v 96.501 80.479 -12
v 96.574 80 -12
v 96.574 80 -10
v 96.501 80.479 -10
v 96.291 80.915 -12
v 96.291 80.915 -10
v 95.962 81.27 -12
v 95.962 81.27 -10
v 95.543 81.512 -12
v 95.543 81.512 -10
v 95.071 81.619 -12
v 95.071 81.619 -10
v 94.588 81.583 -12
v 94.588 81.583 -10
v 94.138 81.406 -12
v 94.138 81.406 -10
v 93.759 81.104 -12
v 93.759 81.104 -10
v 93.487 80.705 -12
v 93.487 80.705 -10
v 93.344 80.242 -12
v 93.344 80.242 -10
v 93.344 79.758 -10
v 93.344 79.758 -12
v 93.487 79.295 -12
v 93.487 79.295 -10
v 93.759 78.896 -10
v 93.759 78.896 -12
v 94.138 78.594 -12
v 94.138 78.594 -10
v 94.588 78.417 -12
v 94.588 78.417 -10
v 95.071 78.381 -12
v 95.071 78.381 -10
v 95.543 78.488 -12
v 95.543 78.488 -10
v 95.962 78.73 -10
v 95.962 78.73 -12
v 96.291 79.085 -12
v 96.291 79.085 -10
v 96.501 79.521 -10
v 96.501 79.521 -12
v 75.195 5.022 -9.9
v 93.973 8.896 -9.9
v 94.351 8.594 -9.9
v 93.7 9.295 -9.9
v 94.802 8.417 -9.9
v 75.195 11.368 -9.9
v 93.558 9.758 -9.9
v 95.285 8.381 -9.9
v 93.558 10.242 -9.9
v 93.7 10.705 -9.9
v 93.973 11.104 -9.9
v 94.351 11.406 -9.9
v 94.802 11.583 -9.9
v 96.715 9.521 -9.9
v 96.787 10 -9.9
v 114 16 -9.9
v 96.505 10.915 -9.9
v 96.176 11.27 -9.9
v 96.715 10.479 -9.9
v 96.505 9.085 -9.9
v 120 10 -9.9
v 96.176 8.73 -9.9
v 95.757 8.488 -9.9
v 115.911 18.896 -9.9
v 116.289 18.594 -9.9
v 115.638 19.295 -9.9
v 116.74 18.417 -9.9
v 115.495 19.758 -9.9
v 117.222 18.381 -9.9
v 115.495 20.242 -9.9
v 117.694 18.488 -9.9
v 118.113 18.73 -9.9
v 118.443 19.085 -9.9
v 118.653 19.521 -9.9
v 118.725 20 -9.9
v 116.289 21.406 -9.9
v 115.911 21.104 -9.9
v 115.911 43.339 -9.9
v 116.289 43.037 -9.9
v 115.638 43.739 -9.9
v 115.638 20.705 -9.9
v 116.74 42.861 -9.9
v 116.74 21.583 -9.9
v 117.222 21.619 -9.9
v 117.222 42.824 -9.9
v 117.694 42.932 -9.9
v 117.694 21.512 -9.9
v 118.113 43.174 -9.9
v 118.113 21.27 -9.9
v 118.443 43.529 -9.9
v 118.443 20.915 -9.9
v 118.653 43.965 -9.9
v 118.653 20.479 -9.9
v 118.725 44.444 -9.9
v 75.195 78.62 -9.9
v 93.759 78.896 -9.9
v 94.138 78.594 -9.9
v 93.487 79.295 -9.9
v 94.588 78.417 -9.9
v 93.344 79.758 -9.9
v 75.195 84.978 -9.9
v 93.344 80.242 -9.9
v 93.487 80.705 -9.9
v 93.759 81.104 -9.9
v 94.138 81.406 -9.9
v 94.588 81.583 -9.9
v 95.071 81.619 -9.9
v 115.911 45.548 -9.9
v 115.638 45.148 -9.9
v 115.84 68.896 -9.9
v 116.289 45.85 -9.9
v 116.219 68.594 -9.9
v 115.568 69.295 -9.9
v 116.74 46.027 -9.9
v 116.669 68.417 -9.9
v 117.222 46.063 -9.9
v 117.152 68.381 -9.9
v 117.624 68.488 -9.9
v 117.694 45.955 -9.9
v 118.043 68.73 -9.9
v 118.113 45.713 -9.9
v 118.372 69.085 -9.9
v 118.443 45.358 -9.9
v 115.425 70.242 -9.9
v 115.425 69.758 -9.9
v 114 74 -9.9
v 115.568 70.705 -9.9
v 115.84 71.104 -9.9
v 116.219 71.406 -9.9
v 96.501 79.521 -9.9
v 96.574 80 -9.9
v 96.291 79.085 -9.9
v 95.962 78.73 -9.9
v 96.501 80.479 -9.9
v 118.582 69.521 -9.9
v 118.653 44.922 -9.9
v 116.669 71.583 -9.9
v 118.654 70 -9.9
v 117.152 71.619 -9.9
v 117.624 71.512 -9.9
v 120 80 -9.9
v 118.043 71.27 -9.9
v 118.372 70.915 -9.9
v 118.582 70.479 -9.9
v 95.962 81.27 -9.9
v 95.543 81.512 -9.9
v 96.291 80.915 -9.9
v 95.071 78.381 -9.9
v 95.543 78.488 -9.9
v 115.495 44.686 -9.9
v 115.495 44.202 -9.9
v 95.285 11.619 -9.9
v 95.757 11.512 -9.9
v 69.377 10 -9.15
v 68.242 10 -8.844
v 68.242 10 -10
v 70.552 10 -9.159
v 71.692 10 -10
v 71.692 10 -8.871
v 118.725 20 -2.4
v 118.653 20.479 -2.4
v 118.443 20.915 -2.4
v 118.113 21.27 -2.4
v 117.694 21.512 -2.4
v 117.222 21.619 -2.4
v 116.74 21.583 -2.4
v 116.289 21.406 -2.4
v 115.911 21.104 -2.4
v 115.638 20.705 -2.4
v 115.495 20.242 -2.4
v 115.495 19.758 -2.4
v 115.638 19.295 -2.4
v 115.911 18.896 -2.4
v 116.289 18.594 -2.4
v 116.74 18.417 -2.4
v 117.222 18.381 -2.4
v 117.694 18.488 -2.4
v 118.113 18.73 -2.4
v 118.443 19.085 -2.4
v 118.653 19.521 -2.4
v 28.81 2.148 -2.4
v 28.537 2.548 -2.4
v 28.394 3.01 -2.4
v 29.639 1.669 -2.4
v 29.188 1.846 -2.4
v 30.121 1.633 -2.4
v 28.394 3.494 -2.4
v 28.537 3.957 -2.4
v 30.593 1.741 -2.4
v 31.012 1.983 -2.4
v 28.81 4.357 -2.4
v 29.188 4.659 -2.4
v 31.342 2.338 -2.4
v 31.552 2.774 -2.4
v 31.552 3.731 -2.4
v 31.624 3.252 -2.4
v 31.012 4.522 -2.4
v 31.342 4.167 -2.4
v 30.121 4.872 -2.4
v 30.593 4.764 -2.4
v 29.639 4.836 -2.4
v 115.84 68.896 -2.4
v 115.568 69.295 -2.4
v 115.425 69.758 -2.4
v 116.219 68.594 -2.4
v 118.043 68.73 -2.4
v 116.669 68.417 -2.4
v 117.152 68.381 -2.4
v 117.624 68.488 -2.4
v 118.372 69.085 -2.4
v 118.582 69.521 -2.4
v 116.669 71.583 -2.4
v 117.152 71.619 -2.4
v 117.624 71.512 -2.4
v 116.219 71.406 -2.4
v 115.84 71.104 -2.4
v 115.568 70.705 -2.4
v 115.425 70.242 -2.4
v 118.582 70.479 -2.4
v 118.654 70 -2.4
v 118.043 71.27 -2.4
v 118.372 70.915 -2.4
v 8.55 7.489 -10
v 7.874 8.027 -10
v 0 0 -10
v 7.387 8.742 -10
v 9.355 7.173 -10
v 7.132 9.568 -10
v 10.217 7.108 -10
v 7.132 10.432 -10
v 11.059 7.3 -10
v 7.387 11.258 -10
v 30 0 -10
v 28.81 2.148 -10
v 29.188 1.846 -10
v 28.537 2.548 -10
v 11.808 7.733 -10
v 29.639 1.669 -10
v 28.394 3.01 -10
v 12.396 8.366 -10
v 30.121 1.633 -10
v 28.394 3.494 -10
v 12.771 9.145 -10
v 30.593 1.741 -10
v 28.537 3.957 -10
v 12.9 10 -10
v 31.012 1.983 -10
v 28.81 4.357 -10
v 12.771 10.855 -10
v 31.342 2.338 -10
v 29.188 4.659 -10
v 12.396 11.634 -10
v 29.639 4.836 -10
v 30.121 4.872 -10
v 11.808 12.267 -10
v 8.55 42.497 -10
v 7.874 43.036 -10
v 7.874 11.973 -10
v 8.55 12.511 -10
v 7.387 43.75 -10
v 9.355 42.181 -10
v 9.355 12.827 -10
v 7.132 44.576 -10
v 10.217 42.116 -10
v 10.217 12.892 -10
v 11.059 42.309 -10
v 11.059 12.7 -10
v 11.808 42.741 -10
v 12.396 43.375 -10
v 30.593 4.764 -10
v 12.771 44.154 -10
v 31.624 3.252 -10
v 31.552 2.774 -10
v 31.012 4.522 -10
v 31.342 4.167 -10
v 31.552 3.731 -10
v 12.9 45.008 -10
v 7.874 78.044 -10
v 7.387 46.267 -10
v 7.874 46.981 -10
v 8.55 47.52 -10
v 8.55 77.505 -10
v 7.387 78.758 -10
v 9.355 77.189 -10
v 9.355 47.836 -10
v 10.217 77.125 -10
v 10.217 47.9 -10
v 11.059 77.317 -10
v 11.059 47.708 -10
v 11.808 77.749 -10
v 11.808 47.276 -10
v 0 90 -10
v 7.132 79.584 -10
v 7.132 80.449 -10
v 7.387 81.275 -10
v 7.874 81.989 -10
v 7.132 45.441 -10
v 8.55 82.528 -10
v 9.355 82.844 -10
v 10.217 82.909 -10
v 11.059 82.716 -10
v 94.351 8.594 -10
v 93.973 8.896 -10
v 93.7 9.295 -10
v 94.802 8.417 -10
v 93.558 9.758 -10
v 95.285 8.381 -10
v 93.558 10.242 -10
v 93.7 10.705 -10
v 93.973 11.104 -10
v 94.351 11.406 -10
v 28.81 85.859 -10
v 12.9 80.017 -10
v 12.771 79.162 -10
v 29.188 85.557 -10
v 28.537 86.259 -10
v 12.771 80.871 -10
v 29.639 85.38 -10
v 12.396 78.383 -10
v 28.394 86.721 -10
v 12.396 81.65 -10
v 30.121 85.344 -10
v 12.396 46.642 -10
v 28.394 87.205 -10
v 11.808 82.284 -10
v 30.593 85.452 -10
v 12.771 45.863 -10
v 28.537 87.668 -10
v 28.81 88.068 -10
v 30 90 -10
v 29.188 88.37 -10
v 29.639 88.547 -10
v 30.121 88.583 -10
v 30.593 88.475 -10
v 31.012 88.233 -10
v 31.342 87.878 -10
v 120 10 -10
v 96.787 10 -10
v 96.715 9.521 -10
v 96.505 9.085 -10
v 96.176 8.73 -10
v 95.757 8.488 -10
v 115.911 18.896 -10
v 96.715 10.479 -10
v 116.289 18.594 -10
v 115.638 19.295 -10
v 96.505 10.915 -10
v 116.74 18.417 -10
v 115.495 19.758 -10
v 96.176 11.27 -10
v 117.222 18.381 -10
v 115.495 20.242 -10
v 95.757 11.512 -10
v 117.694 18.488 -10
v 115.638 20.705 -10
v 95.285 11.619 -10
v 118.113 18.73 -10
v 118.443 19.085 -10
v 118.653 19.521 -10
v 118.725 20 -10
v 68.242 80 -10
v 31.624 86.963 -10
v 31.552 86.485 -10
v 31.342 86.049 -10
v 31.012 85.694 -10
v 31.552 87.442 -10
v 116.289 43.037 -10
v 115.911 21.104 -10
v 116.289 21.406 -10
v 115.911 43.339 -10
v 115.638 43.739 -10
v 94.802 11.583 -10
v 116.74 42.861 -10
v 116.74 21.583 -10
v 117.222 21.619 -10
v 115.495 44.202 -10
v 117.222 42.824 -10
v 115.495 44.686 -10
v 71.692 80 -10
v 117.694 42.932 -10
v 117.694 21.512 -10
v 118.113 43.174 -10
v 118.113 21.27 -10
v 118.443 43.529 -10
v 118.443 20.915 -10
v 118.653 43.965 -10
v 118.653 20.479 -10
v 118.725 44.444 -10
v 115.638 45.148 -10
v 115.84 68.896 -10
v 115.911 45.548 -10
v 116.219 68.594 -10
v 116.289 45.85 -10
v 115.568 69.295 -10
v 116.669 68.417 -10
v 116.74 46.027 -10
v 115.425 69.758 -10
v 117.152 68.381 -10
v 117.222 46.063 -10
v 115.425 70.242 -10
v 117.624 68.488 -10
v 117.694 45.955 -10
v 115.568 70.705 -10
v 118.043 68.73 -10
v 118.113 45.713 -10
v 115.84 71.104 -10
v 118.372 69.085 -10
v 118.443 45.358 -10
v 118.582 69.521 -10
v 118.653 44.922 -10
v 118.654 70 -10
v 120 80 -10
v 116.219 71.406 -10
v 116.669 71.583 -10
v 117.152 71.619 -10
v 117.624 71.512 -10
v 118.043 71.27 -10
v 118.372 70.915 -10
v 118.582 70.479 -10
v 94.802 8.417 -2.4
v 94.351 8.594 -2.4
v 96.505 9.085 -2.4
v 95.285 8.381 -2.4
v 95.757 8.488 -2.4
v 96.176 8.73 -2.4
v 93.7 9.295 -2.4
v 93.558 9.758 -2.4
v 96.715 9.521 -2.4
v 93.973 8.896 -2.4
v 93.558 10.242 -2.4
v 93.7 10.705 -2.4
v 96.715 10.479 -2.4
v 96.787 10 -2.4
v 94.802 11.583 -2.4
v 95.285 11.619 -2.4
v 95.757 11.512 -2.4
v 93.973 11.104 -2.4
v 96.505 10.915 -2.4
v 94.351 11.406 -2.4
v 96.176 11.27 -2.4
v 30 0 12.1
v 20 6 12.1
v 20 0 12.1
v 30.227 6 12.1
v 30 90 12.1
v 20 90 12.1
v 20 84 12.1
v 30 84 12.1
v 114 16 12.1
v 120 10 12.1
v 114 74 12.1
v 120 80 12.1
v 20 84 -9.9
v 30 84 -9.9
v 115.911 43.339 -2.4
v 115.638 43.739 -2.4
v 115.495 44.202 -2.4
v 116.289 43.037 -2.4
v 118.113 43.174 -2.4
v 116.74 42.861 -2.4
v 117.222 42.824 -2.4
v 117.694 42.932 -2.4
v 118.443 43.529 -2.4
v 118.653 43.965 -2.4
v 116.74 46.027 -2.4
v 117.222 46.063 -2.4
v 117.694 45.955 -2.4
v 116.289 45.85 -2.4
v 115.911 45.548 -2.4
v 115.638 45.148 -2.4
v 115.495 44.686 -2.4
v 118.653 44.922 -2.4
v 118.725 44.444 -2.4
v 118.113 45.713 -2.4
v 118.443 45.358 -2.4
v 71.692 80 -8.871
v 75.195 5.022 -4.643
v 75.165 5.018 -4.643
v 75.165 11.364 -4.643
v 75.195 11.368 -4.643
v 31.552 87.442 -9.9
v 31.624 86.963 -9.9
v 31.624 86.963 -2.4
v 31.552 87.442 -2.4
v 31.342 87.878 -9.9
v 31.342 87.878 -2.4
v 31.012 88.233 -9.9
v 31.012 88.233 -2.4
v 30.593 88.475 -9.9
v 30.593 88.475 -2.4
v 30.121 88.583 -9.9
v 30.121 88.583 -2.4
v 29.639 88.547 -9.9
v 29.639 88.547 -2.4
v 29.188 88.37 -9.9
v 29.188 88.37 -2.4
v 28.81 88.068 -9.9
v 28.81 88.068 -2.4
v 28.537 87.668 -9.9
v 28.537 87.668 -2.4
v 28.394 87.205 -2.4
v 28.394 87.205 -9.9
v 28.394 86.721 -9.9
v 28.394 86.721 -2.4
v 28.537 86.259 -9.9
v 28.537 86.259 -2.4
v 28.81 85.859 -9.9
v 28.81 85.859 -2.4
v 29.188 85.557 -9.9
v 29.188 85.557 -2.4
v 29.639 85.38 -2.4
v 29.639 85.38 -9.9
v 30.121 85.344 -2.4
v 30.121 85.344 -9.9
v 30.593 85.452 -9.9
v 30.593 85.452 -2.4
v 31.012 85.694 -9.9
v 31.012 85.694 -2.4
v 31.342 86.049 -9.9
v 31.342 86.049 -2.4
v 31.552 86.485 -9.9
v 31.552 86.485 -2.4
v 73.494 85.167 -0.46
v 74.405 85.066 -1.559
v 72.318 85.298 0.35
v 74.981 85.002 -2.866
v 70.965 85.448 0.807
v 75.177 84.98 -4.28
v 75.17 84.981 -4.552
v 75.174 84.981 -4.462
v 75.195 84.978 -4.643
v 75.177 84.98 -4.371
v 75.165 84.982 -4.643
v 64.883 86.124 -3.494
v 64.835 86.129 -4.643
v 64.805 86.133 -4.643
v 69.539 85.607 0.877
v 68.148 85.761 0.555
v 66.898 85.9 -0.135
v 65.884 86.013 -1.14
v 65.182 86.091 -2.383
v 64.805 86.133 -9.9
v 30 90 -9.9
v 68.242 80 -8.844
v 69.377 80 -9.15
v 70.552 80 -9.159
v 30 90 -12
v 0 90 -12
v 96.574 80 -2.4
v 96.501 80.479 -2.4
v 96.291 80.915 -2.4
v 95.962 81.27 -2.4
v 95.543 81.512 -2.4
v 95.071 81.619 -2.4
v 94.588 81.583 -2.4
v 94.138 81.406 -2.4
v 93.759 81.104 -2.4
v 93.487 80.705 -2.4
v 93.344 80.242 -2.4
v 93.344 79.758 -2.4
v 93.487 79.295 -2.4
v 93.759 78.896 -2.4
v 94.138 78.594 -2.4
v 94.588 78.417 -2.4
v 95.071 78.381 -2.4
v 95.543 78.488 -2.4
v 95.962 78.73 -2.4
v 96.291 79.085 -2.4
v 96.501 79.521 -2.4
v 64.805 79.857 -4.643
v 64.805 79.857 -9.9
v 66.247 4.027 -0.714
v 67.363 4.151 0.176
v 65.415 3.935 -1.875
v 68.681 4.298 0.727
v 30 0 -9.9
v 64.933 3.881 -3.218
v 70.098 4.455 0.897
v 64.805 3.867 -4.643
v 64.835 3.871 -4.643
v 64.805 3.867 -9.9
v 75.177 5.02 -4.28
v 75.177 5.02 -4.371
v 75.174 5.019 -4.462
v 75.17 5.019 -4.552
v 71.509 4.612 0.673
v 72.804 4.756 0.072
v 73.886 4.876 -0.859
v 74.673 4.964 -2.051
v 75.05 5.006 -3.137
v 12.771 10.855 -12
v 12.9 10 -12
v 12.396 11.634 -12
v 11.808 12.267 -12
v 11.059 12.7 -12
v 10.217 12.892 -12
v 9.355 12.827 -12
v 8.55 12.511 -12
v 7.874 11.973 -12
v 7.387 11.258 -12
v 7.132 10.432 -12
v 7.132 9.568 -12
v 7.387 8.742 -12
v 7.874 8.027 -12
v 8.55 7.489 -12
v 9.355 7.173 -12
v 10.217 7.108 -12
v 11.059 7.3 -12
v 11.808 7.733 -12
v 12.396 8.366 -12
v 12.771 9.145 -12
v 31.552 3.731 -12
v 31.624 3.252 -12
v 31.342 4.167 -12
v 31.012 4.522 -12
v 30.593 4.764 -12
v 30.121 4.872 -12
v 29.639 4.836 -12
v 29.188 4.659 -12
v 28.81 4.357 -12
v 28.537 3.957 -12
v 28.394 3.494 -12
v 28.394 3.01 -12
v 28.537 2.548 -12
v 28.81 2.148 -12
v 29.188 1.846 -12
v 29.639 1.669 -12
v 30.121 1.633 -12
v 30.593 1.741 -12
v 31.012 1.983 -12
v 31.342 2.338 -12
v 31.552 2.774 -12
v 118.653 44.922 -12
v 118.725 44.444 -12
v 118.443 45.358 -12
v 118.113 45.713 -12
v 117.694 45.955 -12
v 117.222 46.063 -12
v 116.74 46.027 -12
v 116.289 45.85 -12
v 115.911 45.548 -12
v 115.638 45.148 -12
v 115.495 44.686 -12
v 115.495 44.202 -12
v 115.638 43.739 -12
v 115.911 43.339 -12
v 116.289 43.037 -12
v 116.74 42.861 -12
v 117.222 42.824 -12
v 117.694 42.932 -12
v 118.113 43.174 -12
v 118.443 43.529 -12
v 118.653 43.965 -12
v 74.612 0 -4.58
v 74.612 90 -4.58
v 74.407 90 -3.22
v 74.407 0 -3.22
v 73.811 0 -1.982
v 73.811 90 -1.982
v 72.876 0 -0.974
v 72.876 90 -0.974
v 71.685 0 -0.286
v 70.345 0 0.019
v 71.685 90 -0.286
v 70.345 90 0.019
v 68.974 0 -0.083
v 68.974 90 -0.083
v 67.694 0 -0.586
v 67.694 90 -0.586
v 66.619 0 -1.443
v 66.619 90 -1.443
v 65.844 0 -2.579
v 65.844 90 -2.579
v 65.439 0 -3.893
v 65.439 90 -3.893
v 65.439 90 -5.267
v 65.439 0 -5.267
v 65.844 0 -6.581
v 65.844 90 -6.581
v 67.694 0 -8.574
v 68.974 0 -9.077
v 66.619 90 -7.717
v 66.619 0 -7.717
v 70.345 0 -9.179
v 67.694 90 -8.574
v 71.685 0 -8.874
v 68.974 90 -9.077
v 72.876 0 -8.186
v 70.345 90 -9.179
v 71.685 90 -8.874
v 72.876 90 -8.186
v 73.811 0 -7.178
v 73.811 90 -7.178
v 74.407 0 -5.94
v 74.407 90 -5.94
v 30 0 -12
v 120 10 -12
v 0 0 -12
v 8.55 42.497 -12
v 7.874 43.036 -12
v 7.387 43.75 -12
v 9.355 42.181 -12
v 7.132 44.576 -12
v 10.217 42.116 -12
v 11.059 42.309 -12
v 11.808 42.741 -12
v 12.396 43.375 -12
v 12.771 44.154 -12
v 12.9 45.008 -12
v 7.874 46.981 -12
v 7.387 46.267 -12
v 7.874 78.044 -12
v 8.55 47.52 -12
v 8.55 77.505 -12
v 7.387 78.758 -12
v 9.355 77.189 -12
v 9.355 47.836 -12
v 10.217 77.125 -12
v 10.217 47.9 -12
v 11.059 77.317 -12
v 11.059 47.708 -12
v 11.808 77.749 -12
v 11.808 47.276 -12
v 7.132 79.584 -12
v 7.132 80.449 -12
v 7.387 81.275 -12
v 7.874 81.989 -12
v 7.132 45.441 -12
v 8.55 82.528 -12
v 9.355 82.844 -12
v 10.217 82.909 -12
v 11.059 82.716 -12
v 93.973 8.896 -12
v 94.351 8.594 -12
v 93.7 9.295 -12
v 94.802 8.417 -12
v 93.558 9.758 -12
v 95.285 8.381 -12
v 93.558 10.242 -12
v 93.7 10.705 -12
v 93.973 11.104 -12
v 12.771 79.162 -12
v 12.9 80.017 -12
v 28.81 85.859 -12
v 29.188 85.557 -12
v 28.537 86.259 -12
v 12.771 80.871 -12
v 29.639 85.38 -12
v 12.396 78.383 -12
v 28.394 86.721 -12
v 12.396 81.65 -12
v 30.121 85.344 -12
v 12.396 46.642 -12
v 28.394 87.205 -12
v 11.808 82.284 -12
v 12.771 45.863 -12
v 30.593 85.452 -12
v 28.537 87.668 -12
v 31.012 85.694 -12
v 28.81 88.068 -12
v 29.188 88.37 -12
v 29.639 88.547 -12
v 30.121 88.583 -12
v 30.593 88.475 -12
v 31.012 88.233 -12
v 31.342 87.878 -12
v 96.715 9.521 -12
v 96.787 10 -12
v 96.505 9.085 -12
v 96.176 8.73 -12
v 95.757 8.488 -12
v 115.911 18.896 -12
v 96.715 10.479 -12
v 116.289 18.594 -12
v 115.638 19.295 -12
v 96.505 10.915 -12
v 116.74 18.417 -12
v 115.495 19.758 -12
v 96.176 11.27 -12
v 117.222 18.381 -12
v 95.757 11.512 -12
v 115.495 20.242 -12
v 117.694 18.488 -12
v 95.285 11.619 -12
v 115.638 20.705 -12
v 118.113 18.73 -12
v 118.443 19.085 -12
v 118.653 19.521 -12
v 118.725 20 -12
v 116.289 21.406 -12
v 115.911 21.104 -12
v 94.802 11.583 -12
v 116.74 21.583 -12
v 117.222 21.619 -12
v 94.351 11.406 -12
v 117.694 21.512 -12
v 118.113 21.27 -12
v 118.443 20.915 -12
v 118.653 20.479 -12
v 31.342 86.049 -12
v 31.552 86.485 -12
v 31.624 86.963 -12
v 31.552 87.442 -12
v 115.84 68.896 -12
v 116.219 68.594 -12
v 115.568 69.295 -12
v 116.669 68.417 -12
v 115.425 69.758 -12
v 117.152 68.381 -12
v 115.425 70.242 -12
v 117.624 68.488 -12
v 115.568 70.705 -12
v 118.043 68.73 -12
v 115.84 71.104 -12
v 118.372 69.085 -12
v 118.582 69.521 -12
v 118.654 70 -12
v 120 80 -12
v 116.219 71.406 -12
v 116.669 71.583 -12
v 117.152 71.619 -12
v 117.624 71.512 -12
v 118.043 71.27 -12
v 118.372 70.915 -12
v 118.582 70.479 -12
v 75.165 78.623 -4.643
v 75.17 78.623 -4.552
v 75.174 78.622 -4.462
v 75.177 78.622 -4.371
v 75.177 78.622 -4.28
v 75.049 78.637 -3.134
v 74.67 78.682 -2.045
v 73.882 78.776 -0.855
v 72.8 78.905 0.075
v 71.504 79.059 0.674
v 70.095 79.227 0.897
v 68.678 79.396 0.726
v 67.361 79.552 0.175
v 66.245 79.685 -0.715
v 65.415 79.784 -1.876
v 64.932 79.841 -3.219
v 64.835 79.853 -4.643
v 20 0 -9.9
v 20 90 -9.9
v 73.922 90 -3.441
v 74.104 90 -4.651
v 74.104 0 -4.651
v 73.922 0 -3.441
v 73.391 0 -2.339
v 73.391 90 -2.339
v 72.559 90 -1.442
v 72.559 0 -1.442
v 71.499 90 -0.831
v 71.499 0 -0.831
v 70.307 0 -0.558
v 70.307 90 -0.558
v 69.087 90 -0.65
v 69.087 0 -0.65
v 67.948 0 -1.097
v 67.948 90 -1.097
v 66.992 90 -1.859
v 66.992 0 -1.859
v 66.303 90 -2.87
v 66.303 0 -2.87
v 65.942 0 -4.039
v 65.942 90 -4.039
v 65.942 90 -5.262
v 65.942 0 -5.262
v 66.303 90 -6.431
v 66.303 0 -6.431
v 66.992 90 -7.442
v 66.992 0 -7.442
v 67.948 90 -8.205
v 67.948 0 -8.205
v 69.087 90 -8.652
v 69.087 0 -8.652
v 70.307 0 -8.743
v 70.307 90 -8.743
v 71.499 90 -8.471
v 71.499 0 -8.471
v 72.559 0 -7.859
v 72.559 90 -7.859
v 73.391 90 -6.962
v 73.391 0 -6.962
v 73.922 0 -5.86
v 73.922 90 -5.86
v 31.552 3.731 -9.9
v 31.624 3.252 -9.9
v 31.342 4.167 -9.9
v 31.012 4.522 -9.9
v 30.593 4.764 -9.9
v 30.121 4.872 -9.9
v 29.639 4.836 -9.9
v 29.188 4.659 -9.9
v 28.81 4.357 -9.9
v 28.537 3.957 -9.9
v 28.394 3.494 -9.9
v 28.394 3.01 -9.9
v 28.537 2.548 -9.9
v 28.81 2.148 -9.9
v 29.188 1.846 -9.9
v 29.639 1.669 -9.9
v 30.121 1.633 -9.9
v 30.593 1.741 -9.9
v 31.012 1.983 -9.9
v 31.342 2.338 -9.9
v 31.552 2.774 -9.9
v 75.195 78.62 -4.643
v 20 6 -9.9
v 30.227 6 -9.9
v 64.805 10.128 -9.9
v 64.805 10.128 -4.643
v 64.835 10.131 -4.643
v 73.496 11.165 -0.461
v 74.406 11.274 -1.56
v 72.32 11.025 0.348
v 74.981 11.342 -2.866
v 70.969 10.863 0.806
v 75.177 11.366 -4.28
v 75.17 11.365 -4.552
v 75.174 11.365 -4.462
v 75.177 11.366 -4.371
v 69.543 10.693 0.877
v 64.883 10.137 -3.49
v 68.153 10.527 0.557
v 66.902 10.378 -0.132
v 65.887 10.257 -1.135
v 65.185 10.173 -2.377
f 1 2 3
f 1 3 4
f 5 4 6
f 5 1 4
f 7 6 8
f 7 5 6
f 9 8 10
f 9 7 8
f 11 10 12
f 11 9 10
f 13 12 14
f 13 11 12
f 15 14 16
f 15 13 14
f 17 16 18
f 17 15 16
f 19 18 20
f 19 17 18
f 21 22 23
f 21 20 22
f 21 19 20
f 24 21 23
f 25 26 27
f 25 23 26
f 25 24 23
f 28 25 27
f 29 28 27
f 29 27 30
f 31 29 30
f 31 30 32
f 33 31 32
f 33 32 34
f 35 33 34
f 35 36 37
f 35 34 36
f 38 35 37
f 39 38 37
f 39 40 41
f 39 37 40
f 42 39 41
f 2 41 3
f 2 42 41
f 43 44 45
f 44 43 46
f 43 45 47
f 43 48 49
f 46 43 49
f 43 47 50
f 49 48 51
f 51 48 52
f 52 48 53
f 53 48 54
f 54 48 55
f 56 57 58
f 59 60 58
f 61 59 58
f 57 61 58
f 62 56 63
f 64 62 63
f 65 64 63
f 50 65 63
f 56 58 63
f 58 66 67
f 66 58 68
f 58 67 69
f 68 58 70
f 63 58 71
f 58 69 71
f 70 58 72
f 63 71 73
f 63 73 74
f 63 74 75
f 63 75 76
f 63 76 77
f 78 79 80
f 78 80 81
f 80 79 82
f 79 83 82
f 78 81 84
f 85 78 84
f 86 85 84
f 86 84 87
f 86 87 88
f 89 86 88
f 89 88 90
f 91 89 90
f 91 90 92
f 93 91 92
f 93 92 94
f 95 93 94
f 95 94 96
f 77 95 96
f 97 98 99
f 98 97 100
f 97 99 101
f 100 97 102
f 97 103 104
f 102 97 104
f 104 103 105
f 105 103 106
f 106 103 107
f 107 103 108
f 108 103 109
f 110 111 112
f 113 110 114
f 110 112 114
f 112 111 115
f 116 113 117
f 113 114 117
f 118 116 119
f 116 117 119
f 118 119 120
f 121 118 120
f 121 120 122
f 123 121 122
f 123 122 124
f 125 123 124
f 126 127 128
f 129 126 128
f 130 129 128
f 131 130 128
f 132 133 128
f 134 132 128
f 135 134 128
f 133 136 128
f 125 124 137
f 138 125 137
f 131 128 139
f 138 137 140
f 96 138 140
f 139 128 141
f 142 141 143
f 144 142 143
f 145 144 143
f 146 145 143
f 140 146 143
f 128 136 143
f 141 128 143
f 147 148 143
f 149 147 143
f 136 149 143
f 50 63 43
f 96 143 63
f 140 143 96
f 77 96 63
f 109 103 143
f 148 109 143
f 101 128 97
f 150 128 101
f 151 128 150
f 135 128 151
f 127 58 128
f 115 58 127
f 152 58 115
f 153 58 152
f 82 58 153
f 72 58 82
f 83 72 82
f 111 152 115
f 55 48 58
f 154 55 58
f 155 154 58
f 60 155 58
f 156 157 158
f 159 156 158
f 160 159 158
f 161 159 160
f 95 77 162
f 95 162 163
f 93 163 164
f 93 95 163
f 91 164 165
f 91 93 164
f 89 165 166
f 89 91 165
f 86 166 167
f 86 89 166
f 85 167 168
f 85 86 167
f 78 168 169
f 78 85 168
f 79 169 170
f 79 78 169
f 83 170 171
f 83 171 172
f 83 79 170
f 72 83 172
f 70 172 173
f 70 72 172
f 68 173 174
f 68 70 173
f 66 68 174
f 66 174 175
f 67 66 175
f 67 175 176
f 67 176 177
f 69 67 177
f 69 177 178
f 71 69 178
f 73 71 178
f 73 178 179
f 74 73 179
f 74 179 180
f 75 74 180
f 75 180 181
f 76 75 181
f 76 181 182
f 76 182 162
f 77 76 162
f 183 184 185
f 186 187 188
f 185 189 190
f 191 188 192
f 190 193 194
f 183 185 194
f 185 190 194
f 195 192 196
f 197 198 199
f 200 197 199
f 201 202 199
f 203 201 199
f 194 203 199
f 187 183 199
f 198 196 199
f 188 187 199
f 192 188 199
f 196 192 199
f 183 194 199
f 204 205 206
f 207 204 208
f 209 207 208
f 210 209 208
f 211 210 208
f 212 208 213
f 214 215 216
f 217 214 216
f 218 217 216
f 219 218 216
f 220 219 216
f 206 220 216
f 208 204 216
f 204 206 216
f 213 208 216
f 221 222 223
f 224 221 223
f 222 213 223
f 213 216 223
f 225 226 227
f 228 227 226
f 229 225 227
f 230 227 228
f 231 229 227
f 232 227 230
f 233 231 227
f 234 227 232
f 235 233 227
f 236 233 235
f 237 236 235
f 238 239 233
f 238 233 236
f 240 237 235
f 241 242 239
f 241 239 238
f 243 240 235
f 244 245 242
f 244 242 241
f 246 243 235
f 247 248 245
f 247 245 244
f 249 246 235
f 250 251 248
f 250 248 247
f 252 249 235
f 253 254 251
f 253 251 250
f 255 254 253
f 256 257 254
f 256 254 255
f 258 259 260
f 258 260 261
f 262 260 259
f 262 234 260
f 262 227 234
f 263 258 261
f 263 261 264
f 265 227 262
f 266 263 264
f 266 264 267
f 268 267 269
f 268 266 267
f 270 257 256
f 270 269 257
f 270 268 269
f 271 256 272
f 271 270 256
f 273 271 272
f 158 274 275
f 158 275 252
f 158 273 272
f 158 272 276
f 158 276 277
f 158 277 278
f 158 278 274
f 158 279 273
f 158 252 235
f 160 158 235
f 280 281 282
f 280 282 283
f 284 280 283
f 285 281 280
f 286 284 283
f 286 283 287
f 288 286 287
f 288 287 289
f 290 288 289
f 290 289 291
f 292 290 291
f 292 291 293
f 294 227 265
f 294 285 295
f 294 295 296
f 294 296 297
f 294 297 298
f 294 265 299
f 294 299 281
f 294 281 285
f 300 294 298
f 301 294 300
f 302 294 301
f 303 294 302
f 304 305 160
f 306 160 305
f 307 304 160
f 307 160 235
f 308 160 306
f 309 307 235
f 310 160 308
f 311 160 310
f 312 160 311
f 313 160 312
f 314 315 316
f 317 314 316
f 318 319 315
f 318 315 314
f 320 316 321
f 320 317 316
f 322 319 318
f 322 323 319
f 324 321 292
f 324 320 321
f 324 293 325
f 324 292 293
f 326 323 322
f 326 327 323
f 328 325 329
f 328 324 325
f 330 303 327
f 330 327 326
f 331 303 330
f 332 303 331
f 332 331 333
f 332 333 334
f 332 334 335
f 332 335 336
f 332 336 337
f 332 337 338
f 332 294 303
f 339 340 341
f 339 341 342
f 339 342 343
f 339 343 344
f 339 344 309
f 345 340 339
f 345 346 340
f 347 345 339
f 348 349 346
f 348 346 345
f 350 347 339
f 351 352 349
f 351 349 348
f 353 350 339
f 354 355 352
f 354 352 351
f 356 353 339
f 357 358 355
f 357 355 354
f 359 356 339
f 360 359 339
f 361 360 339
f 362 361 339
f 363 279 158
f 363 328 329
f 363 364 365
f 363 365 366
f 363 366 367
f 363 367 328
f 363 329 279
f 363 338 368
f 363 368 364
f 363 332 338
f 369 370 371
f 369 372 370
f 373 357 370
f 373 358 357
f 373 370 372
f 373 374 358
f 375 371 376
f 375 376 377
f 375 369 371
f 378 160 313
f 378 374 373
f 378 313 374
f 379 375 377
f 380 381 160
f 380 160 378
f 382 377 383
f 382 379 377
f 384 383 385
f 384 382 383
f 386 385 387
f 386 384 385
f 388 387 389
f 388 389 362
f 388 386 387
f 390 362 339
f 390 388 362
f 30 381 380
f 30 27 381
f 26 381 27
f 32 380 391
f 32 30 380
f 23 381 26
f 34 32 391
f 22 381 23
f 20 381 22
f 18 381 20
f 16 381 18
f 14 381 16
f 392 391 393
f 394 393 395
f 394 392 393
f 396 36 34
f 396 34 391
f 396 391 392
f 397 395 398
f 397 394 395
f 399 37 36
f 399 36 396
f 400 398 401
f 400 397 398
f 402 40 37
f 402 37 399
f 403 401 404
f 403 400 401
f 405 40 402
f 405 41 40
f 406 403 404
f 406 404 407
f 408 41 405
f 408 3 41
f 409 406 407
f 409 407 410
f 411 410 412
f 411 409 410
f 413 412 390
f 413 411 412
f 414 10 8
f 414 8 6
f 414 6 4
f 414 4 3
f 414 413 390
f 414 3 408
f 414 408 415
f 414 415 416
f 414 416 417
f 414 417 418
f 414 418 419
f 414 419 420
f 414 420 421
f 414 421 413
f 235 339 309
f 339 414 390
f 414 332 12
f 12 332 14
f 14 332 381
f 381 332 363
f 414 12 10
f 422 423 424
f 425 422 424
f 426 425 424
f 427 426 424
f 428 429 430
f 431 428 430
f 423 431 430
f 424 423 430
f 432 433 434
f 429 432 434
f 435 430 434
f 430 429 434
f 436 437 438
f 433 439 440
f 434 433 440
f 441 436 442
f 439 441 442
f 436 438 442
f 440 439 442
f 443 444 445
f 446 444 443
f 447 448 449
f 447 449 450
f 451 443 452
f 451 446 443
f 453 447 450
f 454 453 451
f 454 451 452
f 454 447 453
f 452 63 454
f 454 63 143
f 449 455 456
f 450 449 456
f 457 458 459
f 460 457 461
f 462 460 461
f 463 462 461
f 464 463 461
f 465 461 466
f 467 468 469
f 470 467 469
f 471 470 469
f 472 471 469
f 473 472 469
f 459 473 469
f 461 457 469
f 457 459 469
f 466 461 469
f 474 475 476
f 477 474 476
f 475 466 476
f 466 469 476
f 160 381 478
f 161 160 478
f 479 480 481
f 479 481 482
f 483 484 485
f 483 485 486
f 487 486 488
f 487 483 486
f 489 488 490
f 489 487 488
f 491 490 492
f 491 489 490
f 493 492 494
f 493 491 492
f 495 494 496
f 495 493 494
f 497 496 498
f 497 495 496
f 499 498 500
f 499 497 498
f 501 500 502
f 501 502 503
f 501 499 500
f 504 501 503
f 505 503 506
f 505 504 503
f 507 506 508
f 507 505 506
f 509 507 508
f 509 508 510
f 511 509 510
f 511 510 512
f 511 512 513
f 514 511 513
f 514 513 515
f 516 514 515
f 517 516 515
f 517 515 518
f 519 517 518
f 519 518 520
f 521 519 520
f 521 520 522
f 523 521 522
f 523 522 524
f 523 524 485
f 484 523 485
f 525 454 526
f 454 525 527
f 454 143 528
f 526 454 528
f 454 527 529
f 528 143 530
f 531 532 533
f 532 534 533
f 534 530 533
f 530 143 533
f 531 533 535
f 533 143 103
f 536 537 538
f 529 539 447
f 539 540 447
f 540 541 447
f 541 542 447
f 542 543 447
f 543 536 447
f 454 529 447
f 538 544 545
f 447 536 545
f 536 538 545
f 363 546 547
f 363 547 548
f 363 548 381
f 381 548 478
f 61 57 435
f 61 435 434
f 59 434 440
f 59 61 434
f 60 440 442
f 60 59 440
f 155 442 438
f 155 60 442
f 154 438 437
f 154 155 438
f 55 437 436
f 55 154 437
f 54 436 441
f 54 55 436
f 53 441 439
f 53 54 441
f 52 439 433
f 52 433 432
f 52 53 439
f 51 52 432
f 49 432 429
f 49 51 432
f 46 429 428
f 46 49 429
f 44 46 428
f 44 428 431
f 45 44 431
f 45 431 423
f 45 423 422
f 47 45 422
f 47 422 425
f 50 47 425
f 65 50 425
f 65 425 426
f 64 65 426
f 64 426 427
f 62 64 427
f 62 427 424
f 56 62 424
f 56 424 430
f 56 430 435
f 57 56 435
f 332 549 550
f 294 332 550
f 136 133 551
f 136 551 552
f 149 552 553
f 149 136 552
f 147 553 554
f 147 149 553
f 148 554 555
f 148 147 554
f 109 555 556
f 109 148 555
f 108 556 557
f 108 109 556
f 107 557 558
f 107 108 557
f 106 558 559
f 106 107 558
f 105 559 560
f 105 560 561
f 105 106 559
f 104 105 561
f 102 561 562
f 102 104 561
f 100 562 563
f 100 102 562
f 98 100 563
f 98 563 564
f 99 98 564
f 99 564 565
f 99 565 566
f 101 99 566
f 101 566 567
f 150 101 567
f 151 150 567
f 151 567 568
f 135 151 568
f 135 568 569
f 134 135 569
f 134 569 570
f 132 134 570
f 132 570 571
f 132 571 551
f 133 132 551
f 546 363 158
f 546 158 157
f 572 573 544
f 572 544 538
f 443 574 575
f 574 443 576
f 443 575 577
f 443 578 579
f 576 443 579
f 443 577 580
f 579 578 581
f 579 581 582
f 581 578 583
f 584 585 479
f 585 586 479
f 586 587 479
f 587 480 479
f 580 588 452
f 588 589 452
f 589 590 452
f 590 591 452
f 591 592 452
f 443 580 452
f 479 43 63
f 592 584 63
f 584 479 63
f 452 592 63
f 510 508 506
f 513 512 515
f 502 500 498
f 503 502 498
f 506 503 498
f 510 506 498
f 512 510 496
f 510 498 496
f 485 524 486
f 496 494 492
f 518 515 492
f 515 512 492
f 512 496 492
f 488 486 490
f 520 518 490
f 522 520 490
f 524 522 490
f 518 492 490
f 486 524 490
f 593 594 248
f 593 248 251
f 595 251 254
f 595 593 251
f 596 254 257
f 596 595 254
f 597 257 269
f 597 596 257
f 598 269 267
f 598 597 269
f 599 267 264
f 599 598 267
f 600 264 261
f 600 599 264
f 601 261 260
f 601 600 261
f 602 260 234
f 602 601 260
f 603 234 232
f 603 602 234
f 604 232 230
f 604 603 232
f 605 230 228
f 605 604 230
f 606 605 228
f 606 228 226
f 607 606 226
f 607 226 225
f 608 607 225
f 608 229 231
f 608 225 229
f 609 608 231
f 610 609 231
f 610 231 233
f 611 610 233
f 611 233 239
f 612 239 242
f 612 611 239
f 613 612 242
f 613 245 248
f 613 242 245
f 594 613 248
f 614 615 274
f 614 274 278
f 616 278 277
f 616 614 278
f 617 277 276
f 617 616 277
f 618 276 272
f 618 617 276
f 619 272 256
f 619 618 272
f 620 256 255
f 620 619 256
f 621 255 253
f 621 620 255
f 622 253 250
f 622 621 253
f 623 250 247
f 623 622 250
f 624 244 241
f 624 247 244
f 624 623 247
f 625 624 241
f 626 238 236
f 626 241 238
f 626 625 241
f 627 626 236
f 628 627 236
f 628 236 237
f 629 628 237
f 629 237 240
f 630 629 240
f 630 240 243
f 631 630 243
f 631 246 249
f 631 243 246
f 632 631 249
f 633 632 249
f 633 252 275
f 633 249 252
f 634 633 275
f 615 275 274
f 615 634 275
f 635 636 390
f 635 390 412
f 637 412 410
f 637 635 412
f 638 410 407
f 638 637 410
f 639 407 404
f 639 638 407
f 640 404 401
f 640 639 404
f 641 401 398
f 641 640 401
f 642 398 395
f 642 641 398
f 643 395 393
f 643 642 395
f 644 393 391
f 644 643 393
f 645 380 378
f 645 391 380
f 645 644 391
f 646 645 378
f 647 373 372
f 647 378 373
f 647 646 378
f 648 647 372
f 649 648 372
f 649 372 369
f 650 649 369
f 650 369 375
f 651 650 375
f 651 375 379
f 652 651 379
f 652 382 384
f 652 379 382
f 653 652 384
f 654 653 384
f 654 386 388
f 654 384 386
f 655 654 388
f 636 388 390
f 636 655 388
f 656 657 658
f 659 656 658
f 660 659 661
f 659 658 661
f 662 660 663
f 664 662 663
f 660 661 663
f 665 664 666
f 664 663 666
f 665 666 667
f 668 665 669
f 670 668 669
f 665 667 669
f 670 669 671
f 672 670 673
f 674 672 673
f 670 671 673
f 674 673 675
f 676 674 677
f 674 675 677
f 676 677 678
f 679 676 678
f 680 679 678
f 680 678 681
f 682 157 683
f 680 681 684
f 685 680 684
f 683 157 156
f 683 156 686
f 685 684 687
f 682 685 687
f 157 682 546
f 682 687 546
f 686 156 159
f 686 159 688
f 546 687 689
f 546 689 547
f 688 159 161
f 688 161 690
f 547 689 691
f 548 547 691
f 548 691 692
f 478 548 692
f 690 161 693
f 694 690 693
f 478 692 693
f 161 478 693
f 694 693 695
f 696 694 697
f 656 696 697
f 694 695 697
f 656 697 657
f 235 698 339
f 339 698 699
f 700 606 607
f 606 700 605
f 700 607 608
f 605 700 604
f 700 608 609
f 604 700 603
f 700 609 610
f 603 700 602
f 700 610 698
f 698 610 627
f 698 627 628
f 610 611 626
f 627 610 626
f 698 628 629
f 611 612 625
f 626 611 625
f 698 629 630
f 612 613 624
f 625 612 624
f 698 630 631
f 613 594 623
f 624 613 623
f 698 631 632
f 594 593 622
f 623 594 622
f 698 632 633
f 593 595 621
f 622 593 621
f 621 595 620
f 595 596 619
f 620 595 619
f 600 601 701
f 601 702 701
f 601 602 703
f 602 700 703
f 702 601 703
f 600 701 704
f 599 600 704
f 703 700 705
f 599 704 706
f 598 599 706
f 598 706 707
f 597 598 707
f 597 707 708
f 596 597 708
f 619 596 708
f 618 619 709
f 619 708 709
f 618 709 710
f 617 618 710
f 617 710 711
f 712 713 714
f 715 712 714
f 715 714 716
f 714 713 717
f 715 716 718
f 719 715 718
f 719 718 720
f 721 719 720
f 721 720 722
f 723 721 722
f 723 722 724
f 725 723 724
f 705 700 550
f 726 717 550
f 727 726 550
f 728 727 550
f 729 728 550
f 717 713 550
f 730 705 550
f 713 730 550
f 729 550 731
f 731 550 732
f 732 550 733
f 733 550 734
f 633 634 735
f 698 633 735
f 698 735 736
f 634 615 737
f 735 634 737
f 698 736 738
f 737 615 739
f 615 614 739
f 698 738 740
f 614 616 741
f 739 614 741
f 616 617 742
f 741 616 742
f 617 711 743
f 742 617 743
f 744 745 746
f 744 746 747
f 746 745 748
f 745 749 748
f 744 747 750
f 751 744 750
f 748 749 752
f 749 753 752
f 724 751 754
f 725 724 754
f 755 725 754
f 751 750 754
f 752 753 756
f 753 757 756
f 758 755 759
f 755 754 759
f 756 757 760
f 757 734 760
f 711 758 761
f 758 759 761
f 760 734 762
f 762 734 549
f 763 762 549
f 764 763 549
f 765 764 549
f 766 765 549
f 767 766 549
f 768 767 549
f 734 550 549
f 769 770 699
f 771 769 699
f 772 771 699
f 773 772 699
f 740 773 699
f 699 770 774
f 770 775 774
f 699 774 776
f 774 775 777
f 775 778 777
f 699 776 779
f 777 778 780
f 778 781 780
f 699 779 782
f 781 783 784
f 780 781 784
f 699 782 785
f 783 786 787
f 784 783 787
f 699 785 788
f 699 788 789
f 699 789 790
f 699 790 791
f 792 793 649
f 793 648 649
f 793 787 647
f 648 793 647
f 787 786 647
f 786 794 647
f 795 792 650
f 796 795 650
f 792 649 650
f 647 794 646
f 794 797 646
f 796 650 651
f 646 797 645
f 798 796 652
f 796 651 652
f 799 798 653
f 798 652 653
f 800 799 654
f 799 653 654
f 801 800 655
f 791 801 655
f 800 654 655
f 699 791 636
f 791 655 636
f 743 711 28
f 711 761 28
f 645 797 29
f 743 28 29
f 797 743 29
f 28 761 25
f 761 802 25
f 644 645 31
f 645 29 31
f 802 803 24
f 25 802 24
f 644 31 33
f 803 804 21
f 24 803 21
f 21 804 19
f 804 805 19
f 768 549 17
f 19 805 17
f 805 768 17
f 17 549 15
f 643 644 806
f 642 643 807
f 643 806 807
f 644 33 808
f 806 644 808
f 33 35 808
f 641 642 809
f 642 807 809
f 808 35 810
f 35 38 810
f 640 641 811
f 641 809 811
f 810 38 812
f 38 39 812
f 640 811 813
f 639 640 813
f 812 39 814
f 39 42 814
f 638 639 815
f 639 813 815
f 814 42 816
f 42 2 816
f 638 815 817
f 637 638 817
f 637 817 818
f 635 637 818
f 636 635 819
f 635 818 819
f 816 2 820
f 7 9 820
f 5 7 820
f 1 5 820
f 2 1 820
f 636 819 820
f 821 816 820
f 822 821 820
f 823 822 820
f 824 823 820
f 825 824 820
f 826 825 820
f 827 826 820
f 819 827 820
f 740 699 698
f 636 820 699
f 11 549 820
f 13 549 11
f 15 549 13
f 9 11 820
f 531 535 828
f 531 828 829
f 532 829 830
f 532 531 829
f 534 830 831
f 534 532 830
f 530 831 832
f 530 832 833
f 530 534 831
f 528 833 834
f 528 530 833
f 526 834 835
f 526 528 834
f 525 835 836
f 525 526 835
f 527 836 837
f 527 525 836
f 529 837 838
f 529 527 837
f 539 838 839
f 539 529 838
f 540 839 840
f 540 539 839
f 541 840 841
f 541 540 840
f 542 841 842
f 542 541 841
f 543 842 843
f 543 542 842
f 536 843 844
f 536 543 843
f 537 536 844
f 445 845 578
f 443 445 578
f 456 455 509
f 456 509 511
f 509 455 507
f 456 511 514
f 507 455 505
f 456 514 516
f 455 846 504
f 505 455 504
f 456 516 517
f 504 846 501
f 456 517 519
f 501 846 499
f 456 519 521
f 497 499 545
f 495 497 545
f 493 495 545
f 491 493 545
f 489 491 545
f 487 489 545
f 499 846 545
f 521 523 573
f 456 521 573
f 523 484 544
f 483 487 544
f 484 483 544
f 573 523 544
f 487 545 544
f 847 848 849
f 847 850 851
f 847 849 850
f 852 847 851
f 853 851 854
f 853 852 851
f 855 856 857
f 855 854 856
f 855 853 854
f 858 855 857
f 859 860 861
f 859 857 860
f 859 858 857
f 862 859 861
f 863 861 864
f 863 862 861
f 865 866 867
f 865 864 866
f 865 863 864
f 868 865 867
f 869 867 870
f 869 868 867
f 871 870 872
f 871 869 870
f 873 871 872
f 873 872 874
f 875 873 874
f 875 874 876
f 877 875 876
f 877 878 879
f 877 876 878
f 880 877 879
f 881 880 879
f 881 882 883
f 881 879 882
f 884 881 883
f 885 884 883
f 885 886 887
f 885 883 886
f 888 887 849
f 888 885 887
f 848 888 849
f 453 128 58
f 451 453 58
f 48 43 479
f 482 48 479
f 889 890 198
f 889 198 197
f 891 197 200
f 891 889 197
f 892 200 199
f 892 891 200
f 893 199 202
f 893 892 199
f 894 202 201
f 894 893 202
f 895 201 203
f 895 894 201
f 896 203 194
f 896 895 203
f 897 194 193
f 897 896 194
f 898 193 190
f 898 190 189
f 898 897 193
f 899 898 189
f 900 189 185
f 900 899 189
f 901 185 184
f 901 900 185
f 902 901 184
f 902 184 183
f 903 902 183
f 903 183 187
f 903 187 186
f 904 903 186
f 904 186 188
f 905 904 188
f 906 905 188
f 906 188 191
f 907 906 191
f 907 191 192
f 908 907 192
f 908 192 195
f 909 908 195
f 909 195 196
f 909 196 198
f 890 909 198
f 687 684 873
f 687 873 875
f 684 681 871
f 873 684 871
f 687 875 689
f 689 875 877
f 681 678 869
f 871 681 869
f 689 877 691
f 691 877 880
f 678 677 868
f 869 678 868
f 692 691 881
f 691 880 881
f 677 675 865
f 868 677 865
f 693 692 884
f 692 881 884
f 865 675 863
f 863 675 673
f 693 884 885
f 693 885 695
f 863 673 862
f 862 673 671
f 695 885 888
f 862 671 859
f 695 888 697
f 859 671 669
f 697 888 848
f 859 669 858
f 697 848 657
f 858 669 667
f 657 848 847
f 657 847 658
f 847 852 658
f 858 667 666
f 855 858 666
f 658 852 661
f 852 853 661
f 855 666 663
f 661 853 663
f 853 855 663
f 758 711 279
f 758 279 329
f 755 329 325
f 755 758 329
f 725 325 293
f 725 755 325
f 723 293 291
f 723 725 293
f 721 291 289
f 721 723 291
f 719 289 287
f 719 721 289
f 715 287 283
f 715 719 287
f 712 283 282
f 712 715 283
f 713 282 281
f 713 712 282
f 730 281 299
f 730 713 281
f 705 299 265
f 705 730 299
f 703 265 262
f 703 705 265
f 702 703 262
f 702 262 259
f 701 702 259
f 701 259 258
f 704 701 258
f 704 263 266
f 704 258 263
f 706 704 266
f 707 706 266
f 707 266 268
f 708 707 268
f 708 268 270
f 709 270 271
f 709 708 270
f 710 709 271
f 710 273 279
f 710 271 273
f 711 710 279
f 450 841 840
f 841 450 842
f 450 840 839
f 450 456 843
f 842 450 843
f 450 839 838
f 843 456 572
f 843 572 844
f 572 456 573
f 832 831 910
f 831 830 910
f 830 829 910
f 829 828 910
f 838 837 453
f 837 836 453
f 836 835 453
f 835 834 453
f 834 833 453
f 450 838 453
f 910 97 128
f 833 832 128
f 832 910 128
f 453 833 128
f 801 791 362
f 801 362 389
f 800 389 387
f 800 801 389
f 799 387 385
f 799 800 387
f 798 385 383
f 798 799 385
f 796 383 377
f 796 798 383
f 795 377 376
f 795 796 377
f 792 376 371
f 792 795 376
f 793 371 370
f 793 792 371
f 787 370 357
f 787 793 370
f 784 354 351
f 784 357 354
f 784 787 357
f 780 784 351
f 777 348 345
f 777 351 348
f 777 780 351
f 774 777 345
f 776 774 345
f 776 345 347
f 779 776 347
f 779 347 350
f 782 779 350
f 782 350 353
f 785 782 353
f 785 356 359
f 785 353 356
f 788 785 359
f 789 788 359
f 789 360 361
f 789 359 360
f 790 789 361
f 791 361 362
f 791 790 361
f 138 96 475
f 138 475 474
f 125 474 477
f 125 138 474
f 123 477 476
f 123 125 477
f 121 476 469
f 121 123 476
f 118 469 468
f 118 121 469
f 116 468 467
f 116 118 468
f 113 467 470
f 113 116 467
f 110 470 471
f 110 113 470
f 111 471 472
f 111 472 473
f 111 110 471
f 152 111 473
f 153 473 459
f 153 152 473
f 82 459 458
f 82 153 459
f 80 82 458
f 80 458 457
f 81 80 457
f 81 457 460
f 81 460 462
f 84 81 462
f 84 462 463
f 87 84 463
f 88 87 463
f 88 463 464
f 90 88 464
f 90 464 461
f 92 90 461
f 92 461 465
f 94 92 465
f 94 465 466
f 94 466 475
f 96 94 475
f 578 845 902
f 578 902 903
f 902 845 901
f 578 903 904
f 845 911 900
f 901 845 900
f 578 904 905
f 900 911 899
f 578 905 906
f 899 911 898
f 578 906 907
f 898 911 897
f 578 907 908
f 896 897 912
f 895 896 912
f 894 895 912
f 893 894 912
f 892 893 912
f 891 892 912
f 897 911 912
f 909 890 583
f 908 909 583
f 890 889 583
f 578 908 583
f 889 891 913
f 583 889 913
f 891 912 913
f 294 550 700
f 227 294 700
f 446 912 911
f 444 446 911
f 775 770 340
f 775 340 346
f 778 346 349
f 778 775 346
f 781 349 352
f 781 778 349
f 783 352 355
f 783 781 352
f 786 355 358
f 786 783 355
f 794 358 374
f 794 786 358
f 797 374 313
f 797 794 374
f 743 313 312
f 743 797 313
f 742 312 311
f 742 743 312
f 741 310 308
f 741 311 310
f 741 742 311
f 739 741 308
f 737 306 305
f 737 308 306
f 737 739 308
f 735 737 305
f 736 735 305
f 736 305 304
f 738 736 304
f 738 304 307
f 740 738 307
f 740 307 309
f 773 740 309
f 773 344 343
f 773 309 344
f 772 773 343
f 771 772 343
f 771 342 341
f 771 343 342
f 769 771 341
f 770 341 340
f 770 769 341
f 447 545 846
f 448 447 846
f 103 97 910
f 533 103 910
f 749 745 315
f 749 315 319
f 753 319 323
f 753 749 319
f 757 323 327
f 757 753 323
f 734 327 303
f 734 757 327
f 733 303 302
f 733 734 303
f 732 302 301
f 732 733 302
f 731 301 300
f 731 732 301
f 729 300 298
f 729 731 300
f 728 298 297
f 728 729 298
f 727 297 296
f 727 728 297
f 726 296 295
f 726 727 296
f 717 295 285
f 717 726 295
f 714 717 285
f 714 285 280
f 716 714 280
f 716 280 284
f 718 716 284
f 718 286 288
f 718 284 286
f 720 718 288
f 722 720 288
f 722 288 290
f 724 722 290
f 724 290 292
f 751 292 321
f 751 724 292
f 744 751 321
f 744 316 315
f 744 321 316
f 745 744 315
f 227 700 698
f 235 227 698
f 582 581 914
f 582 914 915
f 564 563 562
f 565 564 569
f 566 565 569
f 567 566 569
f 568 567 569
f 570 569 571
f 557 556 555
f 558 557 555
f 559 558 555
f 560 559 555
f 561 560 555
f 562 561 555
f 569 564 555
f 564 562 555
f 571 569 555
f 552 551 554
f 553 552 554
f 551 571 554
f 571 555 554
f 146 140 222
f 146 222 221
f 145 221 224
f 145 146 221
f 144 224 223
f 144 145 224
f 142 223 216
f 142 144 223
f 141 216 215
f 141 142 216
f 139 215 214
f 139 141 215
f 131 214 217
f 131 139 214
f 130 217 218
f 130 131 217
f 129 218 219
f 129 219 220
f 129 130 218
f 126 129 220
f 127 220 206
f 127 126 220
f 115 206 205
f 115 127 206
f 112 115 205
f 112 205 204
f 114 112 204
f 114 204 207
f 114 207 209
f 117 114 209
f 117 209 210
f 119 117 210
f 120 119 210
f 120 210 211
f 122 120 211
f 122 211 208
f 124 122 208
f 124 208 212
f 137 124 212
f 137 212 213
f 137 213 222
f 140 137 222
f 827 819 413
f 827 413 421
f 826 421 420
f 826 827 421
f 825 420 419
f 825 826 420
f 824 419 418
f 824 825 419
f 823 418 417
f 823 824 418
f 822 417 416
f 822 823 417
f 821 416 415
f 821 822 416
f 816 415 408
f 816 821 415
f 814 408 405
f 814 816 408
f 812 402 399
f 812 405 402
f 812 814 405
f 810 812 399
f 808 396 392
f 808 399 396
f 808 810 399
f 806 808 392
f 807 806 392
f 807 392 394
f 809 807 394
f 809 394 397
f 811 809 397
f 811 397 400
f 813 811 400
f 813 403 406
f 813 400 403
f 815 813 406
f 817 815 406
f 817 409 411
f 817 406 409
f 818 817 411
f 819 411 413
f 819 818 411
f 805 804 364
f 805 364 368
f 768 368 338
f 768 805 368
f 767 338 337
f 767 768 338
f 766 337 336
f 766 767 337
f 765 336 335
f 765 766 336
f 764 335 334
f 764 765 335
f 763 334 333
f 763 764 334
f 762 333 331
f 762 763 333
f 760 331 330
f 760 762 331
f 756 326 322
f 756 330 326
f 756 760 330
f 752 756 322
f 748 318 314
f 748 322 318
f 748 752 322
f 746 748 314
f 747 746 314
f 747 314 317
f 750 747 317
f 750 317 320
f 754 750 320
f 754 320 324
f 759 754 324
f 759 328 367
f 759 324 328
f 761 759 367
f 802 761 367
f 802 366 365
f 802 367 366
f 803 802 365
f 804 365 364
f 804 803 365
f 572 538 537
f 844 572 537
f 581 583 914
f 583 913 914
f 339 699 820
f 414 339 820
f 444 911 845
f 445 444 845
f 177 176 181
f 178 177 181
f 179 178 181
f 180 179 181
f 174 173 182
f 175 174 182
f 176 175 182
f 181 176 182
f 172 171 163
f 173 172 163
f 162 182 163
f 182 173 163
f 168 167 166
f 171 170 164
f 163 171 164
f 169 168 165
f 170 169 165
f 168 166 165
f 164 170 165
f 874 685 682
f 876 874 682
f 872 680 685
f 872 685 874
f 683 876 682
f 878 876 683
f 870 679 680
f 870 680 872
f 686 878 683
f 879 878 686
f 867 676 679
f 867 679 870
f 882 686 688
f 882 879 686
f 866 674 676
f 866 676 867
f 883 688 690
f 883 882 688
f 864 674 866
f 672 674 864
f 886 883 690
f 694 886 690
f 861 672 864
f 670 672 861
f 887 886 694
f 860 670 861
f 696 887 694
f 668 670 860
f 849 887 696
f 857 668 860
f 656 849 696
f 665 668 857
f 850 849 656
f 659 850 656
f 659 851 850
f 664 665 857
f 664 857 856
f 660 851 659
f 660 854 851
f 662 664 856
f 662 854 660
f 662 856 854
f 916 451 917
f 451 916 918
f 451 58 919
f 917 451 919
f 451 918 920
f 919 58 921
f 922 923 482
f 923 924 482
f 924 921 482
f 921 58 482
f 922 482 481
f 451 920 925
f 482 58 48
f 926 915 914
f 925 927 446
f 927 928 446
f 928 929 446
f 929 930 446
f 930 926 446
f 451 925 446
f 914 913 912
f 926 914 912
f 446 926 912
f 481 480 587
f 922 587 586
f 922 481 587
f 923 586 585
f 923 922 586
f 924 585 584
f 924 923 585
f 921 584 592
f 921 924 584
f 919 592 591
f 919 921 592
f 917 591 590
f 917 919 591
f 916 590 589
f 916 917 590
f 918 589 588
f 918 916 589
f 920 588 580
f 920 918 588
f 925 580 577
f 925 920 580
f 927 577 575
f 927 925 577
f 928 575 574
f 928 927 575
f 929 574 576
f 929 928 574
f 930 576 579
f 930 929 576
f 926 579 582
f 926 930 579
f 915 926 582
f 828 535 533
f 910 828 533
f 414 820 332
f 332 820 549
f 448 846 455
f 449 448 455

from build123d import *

# Parameters (mm, degrees)
SKETCH013_R      = 4.103857
EXTRUDE012_DEPTH = 120
SKETCH012_R      = 4.612338
EXTRUDE011_DEPTH = 90
SKETCH031_W      = 3.449714
SKETCH031_H      = 1.767909
EXTRUDE033_DEPTH = 70
SKETCH_R         = 1.623797
EXTRUDE_DEPTH    = 10
SKETCH003_R      = 2.9
EXTRUDE005_DEPTH = 50
EXTRUDE002_DEPTH = 2
SKETCH044_W      = 10.390858
SKETCH044_H      = 5.392216
EXTRUDE047_DEPTH = 100
SKETCH043_R      = 1.623797
EXTRUDE046_DEPTH = 10
SKETCH042_R      = 5.177463
EXTRUDE045_DEPTH = 800
EXTRUDE044_DEPTH = 22


with BuildPart() as extrude012:
    # Sketch013 → Extrude012 (new body)
    with BuildSketch(Plane.XZ):
        with Locations((70, 3.549289)):
            Circle(SKETCH013_R)
    extrude(amount=EXTRUDE012_DEPTH)


with BuildPart() as extrude012_1:
    # Extrude012 placement: moved
    add(extrude012.part.moved(Location((0, 105, 0))))


with BuildPart() as tubo:
    # Sketch012 → Extrude011 (new body)
    with BuildSketch(Plane.XZ):
        with Locations((70, 3.62)):
            Circle(SKETCH012_R)
    extrude(amount=EXTRUDE011_DEPTH)


with BuildPart() as tubo_1:
    # Extrude011 placement: moved
    add(tubo.part.moved(Location((0, 90, 0))))

    # Cut004: cut Extrude012
    add(extrude012_1.part, mode=Mode.SUBTRACT)


with BuildPart() as fusion015:
    # Sketch031 → Extrude033 (new body)
    with BuildSketch(Plane.XZ):
        with Locations((69.96706, -1.473137)):
            Rectangle(SKETCH031_W, SKETCH031_H)
    extrude(amount=EXTRUDE033_DEPTH)


with BuildPart() as fusion015_1:
    # Extrude033 placement: moved
    add(fusion015.part.moved(Location((0, 80, 0))))

    # Fusion015: union Tubo
    add(tubo_1.part)


with BuildPart() as fusion015_2:
    # Fusion015 placement: moved
    add(fusion015_1.part.moved(Location((0, 0, -8.2))))


with BuildPart() as extrude_body:
    # Sketch (on Face4 of Cut014) → Extrude (new body)
    with BuildSketch(Plane.XY.offset(12.1)):
        with Locations((30, 86.963425)):
            Circle(SKETCH_R)
        with Locations((30, 3.252438)):
            Circle(SKETCH_R)
        with Locations((95.163345, 10)):
            Circle(SKETCH_R)
        with Locations((94.949776, 80)):
            Circle(SKETCH_R)
        with Locations((117.10096, 20)):
            Circle(SKETCH_R)
        with Locations((117.030609, 70)):
            Circle(SKETCH_R)
        with Locations((117.10096, 44.443623)):
            Circle(SKETCH_R)
    extrude(amount=EXTRUDE_DEPTH)


with BuildPart() as extrude_body_1:
    # Extrude placement: moved
    add(extrude_body.part.moved(Location((0, 0, -27.7))))


with BuildPart() as tornillos002:
    # Sketch003 (on Face8 of Extrude002) → Extrude005 (new body)
    with BuildSketch(Plane.XY.offset(2)):
        with Locations((10, 80.016689)):
            Circle(SKETCH003_R)
        with Locations((10, 45.008344)):
            Circle(SKETCH003_R)
        with Locations((10, 10)):
            Circle(SKETCH003_R)
    extrude(amount=EXTRUDE005_DEPTH)


with BuildPart() as tornillos002_1:
    # Extrude005 placement: moved
    add(tornillos002.part.moved(Location((0, 0, -21))))


with BuildPart() as base:
    # Sketch002 → Extrude002 (new body)
    with BuildSketch(Plane.XY):
        Polygon((0, 0), (30, 0), (120, 10), (120, 80), (30, 90), (0, 90), align=None)
    extrude(amount=EXTRUDE002_DEPTH)

    # Cut002: cut Tornillos002
    add(tornillos002_1.part, mode=Mode.SUBTRACT)


with BuildPart() as base_1:
    # Cut002 placement: moved
    add(base.part.moved(Location((0, 0, -12))))

    # Cut: cut Extrude body
    add(extrude_body_1.part, mode=Mode.SUBTRACT)

    # Fusion: union Fusion015
    add(fusion015_2.part)


with BuildPart() as extrude047:
    # Sketch044 → Extrude047 (new body)
    with BuildSketch(Plane.XZ):
        with Locations((70, -7.3389)):
            Rectangle(SKETCH044_W, SKETCH044_H)
    extrude(amount=EXTRUDE047_DEPTH)


with BuildPart() as extrude047_1:
    # Extrude047 placement: moved
    add(extrude047.part.moved(Location((0, 96.2, 0))))


with BuildPart() as extrude046:
    # Sketch043 → Extrude046 (new body)
    with BuildSketch(Plane.XY.offset(12.1)):
        with Locations((30, 86.963425)):
            Circle(SKETCH043_R)
        with Locations((30, 3.252438)):
            Circle(SKETCH043_R)
        with Locations((95.163345, 10)):
            Circle(SKETCH043_R)
        with Locations((94.949776, 80)):
            Circle(SKETCH043_R)
        with Locations((117.10096, 20)):
            Circle(SKETCH043_R)
        with Locations((117.030609, 70)):
            Circle(SKETCH043_R)
        with Locations((117.10096, 44.443623)):
            Circle(SKETCH043_R)
    extrude(amount=EXTRUDE046_DEPTH)


with BuildPart() as extrude046_1:
    # Extrude046 placement: moved
    add(extrude046.part.moved(Location((0, 0, -24.5))))


with BuildPart() as extrude045:
    # Sketch042 → Extrude045 (new body)
    with BuildSketch(Plane.XZ):
        with Locations((70, 3.62)):
            Circle(SKETCH042_R)
    extrude(amount=EXTRUDE045_DEPTH)


with BuildPart() as extrude045_1:
    # Extrude045 placement: moved
    add(extrude045.part.moved(Location((0, 293, 0))))


with BuildPart() as carvasa:
    # Sketch041 → Extrude044 (new body)
    with BuildSketch(Plane.XY):
        Polygon((30, 0), (120, 10), (120, 80), (30, 90), (20, 90), (20, 84), (30, 84), (114, 74), (114, 16), (30.22679, 6), (20, 6), (20, 0), align=None)
    extrude(amount=EXTRUDE044_DEPTH)


with BuildPart() as carvasa_1:
    # Extrude044 placement: moved
    add(carvasa.part.moved(Location((0, 0, -2))))

    # Cut014: cut Extrude045
    add(extrude045_1.part, mode=Mode.SUBTRACT)


with BuildPart() as carvasa_2:
    # Cut014 placement: moved
    add(carvasa_1.part.moved(Location((0, 0, -7.9))))

    # Cut015: cut Extrude046
    add(extrude046_1.part, mode=Mode.SUBTRACT)

    # Cut016: cut Extrude047
    add(extrude047_1.part, mode=Mode.SUBTRACT)


solid = Compound([base_1.part, carvasa_2.part])
